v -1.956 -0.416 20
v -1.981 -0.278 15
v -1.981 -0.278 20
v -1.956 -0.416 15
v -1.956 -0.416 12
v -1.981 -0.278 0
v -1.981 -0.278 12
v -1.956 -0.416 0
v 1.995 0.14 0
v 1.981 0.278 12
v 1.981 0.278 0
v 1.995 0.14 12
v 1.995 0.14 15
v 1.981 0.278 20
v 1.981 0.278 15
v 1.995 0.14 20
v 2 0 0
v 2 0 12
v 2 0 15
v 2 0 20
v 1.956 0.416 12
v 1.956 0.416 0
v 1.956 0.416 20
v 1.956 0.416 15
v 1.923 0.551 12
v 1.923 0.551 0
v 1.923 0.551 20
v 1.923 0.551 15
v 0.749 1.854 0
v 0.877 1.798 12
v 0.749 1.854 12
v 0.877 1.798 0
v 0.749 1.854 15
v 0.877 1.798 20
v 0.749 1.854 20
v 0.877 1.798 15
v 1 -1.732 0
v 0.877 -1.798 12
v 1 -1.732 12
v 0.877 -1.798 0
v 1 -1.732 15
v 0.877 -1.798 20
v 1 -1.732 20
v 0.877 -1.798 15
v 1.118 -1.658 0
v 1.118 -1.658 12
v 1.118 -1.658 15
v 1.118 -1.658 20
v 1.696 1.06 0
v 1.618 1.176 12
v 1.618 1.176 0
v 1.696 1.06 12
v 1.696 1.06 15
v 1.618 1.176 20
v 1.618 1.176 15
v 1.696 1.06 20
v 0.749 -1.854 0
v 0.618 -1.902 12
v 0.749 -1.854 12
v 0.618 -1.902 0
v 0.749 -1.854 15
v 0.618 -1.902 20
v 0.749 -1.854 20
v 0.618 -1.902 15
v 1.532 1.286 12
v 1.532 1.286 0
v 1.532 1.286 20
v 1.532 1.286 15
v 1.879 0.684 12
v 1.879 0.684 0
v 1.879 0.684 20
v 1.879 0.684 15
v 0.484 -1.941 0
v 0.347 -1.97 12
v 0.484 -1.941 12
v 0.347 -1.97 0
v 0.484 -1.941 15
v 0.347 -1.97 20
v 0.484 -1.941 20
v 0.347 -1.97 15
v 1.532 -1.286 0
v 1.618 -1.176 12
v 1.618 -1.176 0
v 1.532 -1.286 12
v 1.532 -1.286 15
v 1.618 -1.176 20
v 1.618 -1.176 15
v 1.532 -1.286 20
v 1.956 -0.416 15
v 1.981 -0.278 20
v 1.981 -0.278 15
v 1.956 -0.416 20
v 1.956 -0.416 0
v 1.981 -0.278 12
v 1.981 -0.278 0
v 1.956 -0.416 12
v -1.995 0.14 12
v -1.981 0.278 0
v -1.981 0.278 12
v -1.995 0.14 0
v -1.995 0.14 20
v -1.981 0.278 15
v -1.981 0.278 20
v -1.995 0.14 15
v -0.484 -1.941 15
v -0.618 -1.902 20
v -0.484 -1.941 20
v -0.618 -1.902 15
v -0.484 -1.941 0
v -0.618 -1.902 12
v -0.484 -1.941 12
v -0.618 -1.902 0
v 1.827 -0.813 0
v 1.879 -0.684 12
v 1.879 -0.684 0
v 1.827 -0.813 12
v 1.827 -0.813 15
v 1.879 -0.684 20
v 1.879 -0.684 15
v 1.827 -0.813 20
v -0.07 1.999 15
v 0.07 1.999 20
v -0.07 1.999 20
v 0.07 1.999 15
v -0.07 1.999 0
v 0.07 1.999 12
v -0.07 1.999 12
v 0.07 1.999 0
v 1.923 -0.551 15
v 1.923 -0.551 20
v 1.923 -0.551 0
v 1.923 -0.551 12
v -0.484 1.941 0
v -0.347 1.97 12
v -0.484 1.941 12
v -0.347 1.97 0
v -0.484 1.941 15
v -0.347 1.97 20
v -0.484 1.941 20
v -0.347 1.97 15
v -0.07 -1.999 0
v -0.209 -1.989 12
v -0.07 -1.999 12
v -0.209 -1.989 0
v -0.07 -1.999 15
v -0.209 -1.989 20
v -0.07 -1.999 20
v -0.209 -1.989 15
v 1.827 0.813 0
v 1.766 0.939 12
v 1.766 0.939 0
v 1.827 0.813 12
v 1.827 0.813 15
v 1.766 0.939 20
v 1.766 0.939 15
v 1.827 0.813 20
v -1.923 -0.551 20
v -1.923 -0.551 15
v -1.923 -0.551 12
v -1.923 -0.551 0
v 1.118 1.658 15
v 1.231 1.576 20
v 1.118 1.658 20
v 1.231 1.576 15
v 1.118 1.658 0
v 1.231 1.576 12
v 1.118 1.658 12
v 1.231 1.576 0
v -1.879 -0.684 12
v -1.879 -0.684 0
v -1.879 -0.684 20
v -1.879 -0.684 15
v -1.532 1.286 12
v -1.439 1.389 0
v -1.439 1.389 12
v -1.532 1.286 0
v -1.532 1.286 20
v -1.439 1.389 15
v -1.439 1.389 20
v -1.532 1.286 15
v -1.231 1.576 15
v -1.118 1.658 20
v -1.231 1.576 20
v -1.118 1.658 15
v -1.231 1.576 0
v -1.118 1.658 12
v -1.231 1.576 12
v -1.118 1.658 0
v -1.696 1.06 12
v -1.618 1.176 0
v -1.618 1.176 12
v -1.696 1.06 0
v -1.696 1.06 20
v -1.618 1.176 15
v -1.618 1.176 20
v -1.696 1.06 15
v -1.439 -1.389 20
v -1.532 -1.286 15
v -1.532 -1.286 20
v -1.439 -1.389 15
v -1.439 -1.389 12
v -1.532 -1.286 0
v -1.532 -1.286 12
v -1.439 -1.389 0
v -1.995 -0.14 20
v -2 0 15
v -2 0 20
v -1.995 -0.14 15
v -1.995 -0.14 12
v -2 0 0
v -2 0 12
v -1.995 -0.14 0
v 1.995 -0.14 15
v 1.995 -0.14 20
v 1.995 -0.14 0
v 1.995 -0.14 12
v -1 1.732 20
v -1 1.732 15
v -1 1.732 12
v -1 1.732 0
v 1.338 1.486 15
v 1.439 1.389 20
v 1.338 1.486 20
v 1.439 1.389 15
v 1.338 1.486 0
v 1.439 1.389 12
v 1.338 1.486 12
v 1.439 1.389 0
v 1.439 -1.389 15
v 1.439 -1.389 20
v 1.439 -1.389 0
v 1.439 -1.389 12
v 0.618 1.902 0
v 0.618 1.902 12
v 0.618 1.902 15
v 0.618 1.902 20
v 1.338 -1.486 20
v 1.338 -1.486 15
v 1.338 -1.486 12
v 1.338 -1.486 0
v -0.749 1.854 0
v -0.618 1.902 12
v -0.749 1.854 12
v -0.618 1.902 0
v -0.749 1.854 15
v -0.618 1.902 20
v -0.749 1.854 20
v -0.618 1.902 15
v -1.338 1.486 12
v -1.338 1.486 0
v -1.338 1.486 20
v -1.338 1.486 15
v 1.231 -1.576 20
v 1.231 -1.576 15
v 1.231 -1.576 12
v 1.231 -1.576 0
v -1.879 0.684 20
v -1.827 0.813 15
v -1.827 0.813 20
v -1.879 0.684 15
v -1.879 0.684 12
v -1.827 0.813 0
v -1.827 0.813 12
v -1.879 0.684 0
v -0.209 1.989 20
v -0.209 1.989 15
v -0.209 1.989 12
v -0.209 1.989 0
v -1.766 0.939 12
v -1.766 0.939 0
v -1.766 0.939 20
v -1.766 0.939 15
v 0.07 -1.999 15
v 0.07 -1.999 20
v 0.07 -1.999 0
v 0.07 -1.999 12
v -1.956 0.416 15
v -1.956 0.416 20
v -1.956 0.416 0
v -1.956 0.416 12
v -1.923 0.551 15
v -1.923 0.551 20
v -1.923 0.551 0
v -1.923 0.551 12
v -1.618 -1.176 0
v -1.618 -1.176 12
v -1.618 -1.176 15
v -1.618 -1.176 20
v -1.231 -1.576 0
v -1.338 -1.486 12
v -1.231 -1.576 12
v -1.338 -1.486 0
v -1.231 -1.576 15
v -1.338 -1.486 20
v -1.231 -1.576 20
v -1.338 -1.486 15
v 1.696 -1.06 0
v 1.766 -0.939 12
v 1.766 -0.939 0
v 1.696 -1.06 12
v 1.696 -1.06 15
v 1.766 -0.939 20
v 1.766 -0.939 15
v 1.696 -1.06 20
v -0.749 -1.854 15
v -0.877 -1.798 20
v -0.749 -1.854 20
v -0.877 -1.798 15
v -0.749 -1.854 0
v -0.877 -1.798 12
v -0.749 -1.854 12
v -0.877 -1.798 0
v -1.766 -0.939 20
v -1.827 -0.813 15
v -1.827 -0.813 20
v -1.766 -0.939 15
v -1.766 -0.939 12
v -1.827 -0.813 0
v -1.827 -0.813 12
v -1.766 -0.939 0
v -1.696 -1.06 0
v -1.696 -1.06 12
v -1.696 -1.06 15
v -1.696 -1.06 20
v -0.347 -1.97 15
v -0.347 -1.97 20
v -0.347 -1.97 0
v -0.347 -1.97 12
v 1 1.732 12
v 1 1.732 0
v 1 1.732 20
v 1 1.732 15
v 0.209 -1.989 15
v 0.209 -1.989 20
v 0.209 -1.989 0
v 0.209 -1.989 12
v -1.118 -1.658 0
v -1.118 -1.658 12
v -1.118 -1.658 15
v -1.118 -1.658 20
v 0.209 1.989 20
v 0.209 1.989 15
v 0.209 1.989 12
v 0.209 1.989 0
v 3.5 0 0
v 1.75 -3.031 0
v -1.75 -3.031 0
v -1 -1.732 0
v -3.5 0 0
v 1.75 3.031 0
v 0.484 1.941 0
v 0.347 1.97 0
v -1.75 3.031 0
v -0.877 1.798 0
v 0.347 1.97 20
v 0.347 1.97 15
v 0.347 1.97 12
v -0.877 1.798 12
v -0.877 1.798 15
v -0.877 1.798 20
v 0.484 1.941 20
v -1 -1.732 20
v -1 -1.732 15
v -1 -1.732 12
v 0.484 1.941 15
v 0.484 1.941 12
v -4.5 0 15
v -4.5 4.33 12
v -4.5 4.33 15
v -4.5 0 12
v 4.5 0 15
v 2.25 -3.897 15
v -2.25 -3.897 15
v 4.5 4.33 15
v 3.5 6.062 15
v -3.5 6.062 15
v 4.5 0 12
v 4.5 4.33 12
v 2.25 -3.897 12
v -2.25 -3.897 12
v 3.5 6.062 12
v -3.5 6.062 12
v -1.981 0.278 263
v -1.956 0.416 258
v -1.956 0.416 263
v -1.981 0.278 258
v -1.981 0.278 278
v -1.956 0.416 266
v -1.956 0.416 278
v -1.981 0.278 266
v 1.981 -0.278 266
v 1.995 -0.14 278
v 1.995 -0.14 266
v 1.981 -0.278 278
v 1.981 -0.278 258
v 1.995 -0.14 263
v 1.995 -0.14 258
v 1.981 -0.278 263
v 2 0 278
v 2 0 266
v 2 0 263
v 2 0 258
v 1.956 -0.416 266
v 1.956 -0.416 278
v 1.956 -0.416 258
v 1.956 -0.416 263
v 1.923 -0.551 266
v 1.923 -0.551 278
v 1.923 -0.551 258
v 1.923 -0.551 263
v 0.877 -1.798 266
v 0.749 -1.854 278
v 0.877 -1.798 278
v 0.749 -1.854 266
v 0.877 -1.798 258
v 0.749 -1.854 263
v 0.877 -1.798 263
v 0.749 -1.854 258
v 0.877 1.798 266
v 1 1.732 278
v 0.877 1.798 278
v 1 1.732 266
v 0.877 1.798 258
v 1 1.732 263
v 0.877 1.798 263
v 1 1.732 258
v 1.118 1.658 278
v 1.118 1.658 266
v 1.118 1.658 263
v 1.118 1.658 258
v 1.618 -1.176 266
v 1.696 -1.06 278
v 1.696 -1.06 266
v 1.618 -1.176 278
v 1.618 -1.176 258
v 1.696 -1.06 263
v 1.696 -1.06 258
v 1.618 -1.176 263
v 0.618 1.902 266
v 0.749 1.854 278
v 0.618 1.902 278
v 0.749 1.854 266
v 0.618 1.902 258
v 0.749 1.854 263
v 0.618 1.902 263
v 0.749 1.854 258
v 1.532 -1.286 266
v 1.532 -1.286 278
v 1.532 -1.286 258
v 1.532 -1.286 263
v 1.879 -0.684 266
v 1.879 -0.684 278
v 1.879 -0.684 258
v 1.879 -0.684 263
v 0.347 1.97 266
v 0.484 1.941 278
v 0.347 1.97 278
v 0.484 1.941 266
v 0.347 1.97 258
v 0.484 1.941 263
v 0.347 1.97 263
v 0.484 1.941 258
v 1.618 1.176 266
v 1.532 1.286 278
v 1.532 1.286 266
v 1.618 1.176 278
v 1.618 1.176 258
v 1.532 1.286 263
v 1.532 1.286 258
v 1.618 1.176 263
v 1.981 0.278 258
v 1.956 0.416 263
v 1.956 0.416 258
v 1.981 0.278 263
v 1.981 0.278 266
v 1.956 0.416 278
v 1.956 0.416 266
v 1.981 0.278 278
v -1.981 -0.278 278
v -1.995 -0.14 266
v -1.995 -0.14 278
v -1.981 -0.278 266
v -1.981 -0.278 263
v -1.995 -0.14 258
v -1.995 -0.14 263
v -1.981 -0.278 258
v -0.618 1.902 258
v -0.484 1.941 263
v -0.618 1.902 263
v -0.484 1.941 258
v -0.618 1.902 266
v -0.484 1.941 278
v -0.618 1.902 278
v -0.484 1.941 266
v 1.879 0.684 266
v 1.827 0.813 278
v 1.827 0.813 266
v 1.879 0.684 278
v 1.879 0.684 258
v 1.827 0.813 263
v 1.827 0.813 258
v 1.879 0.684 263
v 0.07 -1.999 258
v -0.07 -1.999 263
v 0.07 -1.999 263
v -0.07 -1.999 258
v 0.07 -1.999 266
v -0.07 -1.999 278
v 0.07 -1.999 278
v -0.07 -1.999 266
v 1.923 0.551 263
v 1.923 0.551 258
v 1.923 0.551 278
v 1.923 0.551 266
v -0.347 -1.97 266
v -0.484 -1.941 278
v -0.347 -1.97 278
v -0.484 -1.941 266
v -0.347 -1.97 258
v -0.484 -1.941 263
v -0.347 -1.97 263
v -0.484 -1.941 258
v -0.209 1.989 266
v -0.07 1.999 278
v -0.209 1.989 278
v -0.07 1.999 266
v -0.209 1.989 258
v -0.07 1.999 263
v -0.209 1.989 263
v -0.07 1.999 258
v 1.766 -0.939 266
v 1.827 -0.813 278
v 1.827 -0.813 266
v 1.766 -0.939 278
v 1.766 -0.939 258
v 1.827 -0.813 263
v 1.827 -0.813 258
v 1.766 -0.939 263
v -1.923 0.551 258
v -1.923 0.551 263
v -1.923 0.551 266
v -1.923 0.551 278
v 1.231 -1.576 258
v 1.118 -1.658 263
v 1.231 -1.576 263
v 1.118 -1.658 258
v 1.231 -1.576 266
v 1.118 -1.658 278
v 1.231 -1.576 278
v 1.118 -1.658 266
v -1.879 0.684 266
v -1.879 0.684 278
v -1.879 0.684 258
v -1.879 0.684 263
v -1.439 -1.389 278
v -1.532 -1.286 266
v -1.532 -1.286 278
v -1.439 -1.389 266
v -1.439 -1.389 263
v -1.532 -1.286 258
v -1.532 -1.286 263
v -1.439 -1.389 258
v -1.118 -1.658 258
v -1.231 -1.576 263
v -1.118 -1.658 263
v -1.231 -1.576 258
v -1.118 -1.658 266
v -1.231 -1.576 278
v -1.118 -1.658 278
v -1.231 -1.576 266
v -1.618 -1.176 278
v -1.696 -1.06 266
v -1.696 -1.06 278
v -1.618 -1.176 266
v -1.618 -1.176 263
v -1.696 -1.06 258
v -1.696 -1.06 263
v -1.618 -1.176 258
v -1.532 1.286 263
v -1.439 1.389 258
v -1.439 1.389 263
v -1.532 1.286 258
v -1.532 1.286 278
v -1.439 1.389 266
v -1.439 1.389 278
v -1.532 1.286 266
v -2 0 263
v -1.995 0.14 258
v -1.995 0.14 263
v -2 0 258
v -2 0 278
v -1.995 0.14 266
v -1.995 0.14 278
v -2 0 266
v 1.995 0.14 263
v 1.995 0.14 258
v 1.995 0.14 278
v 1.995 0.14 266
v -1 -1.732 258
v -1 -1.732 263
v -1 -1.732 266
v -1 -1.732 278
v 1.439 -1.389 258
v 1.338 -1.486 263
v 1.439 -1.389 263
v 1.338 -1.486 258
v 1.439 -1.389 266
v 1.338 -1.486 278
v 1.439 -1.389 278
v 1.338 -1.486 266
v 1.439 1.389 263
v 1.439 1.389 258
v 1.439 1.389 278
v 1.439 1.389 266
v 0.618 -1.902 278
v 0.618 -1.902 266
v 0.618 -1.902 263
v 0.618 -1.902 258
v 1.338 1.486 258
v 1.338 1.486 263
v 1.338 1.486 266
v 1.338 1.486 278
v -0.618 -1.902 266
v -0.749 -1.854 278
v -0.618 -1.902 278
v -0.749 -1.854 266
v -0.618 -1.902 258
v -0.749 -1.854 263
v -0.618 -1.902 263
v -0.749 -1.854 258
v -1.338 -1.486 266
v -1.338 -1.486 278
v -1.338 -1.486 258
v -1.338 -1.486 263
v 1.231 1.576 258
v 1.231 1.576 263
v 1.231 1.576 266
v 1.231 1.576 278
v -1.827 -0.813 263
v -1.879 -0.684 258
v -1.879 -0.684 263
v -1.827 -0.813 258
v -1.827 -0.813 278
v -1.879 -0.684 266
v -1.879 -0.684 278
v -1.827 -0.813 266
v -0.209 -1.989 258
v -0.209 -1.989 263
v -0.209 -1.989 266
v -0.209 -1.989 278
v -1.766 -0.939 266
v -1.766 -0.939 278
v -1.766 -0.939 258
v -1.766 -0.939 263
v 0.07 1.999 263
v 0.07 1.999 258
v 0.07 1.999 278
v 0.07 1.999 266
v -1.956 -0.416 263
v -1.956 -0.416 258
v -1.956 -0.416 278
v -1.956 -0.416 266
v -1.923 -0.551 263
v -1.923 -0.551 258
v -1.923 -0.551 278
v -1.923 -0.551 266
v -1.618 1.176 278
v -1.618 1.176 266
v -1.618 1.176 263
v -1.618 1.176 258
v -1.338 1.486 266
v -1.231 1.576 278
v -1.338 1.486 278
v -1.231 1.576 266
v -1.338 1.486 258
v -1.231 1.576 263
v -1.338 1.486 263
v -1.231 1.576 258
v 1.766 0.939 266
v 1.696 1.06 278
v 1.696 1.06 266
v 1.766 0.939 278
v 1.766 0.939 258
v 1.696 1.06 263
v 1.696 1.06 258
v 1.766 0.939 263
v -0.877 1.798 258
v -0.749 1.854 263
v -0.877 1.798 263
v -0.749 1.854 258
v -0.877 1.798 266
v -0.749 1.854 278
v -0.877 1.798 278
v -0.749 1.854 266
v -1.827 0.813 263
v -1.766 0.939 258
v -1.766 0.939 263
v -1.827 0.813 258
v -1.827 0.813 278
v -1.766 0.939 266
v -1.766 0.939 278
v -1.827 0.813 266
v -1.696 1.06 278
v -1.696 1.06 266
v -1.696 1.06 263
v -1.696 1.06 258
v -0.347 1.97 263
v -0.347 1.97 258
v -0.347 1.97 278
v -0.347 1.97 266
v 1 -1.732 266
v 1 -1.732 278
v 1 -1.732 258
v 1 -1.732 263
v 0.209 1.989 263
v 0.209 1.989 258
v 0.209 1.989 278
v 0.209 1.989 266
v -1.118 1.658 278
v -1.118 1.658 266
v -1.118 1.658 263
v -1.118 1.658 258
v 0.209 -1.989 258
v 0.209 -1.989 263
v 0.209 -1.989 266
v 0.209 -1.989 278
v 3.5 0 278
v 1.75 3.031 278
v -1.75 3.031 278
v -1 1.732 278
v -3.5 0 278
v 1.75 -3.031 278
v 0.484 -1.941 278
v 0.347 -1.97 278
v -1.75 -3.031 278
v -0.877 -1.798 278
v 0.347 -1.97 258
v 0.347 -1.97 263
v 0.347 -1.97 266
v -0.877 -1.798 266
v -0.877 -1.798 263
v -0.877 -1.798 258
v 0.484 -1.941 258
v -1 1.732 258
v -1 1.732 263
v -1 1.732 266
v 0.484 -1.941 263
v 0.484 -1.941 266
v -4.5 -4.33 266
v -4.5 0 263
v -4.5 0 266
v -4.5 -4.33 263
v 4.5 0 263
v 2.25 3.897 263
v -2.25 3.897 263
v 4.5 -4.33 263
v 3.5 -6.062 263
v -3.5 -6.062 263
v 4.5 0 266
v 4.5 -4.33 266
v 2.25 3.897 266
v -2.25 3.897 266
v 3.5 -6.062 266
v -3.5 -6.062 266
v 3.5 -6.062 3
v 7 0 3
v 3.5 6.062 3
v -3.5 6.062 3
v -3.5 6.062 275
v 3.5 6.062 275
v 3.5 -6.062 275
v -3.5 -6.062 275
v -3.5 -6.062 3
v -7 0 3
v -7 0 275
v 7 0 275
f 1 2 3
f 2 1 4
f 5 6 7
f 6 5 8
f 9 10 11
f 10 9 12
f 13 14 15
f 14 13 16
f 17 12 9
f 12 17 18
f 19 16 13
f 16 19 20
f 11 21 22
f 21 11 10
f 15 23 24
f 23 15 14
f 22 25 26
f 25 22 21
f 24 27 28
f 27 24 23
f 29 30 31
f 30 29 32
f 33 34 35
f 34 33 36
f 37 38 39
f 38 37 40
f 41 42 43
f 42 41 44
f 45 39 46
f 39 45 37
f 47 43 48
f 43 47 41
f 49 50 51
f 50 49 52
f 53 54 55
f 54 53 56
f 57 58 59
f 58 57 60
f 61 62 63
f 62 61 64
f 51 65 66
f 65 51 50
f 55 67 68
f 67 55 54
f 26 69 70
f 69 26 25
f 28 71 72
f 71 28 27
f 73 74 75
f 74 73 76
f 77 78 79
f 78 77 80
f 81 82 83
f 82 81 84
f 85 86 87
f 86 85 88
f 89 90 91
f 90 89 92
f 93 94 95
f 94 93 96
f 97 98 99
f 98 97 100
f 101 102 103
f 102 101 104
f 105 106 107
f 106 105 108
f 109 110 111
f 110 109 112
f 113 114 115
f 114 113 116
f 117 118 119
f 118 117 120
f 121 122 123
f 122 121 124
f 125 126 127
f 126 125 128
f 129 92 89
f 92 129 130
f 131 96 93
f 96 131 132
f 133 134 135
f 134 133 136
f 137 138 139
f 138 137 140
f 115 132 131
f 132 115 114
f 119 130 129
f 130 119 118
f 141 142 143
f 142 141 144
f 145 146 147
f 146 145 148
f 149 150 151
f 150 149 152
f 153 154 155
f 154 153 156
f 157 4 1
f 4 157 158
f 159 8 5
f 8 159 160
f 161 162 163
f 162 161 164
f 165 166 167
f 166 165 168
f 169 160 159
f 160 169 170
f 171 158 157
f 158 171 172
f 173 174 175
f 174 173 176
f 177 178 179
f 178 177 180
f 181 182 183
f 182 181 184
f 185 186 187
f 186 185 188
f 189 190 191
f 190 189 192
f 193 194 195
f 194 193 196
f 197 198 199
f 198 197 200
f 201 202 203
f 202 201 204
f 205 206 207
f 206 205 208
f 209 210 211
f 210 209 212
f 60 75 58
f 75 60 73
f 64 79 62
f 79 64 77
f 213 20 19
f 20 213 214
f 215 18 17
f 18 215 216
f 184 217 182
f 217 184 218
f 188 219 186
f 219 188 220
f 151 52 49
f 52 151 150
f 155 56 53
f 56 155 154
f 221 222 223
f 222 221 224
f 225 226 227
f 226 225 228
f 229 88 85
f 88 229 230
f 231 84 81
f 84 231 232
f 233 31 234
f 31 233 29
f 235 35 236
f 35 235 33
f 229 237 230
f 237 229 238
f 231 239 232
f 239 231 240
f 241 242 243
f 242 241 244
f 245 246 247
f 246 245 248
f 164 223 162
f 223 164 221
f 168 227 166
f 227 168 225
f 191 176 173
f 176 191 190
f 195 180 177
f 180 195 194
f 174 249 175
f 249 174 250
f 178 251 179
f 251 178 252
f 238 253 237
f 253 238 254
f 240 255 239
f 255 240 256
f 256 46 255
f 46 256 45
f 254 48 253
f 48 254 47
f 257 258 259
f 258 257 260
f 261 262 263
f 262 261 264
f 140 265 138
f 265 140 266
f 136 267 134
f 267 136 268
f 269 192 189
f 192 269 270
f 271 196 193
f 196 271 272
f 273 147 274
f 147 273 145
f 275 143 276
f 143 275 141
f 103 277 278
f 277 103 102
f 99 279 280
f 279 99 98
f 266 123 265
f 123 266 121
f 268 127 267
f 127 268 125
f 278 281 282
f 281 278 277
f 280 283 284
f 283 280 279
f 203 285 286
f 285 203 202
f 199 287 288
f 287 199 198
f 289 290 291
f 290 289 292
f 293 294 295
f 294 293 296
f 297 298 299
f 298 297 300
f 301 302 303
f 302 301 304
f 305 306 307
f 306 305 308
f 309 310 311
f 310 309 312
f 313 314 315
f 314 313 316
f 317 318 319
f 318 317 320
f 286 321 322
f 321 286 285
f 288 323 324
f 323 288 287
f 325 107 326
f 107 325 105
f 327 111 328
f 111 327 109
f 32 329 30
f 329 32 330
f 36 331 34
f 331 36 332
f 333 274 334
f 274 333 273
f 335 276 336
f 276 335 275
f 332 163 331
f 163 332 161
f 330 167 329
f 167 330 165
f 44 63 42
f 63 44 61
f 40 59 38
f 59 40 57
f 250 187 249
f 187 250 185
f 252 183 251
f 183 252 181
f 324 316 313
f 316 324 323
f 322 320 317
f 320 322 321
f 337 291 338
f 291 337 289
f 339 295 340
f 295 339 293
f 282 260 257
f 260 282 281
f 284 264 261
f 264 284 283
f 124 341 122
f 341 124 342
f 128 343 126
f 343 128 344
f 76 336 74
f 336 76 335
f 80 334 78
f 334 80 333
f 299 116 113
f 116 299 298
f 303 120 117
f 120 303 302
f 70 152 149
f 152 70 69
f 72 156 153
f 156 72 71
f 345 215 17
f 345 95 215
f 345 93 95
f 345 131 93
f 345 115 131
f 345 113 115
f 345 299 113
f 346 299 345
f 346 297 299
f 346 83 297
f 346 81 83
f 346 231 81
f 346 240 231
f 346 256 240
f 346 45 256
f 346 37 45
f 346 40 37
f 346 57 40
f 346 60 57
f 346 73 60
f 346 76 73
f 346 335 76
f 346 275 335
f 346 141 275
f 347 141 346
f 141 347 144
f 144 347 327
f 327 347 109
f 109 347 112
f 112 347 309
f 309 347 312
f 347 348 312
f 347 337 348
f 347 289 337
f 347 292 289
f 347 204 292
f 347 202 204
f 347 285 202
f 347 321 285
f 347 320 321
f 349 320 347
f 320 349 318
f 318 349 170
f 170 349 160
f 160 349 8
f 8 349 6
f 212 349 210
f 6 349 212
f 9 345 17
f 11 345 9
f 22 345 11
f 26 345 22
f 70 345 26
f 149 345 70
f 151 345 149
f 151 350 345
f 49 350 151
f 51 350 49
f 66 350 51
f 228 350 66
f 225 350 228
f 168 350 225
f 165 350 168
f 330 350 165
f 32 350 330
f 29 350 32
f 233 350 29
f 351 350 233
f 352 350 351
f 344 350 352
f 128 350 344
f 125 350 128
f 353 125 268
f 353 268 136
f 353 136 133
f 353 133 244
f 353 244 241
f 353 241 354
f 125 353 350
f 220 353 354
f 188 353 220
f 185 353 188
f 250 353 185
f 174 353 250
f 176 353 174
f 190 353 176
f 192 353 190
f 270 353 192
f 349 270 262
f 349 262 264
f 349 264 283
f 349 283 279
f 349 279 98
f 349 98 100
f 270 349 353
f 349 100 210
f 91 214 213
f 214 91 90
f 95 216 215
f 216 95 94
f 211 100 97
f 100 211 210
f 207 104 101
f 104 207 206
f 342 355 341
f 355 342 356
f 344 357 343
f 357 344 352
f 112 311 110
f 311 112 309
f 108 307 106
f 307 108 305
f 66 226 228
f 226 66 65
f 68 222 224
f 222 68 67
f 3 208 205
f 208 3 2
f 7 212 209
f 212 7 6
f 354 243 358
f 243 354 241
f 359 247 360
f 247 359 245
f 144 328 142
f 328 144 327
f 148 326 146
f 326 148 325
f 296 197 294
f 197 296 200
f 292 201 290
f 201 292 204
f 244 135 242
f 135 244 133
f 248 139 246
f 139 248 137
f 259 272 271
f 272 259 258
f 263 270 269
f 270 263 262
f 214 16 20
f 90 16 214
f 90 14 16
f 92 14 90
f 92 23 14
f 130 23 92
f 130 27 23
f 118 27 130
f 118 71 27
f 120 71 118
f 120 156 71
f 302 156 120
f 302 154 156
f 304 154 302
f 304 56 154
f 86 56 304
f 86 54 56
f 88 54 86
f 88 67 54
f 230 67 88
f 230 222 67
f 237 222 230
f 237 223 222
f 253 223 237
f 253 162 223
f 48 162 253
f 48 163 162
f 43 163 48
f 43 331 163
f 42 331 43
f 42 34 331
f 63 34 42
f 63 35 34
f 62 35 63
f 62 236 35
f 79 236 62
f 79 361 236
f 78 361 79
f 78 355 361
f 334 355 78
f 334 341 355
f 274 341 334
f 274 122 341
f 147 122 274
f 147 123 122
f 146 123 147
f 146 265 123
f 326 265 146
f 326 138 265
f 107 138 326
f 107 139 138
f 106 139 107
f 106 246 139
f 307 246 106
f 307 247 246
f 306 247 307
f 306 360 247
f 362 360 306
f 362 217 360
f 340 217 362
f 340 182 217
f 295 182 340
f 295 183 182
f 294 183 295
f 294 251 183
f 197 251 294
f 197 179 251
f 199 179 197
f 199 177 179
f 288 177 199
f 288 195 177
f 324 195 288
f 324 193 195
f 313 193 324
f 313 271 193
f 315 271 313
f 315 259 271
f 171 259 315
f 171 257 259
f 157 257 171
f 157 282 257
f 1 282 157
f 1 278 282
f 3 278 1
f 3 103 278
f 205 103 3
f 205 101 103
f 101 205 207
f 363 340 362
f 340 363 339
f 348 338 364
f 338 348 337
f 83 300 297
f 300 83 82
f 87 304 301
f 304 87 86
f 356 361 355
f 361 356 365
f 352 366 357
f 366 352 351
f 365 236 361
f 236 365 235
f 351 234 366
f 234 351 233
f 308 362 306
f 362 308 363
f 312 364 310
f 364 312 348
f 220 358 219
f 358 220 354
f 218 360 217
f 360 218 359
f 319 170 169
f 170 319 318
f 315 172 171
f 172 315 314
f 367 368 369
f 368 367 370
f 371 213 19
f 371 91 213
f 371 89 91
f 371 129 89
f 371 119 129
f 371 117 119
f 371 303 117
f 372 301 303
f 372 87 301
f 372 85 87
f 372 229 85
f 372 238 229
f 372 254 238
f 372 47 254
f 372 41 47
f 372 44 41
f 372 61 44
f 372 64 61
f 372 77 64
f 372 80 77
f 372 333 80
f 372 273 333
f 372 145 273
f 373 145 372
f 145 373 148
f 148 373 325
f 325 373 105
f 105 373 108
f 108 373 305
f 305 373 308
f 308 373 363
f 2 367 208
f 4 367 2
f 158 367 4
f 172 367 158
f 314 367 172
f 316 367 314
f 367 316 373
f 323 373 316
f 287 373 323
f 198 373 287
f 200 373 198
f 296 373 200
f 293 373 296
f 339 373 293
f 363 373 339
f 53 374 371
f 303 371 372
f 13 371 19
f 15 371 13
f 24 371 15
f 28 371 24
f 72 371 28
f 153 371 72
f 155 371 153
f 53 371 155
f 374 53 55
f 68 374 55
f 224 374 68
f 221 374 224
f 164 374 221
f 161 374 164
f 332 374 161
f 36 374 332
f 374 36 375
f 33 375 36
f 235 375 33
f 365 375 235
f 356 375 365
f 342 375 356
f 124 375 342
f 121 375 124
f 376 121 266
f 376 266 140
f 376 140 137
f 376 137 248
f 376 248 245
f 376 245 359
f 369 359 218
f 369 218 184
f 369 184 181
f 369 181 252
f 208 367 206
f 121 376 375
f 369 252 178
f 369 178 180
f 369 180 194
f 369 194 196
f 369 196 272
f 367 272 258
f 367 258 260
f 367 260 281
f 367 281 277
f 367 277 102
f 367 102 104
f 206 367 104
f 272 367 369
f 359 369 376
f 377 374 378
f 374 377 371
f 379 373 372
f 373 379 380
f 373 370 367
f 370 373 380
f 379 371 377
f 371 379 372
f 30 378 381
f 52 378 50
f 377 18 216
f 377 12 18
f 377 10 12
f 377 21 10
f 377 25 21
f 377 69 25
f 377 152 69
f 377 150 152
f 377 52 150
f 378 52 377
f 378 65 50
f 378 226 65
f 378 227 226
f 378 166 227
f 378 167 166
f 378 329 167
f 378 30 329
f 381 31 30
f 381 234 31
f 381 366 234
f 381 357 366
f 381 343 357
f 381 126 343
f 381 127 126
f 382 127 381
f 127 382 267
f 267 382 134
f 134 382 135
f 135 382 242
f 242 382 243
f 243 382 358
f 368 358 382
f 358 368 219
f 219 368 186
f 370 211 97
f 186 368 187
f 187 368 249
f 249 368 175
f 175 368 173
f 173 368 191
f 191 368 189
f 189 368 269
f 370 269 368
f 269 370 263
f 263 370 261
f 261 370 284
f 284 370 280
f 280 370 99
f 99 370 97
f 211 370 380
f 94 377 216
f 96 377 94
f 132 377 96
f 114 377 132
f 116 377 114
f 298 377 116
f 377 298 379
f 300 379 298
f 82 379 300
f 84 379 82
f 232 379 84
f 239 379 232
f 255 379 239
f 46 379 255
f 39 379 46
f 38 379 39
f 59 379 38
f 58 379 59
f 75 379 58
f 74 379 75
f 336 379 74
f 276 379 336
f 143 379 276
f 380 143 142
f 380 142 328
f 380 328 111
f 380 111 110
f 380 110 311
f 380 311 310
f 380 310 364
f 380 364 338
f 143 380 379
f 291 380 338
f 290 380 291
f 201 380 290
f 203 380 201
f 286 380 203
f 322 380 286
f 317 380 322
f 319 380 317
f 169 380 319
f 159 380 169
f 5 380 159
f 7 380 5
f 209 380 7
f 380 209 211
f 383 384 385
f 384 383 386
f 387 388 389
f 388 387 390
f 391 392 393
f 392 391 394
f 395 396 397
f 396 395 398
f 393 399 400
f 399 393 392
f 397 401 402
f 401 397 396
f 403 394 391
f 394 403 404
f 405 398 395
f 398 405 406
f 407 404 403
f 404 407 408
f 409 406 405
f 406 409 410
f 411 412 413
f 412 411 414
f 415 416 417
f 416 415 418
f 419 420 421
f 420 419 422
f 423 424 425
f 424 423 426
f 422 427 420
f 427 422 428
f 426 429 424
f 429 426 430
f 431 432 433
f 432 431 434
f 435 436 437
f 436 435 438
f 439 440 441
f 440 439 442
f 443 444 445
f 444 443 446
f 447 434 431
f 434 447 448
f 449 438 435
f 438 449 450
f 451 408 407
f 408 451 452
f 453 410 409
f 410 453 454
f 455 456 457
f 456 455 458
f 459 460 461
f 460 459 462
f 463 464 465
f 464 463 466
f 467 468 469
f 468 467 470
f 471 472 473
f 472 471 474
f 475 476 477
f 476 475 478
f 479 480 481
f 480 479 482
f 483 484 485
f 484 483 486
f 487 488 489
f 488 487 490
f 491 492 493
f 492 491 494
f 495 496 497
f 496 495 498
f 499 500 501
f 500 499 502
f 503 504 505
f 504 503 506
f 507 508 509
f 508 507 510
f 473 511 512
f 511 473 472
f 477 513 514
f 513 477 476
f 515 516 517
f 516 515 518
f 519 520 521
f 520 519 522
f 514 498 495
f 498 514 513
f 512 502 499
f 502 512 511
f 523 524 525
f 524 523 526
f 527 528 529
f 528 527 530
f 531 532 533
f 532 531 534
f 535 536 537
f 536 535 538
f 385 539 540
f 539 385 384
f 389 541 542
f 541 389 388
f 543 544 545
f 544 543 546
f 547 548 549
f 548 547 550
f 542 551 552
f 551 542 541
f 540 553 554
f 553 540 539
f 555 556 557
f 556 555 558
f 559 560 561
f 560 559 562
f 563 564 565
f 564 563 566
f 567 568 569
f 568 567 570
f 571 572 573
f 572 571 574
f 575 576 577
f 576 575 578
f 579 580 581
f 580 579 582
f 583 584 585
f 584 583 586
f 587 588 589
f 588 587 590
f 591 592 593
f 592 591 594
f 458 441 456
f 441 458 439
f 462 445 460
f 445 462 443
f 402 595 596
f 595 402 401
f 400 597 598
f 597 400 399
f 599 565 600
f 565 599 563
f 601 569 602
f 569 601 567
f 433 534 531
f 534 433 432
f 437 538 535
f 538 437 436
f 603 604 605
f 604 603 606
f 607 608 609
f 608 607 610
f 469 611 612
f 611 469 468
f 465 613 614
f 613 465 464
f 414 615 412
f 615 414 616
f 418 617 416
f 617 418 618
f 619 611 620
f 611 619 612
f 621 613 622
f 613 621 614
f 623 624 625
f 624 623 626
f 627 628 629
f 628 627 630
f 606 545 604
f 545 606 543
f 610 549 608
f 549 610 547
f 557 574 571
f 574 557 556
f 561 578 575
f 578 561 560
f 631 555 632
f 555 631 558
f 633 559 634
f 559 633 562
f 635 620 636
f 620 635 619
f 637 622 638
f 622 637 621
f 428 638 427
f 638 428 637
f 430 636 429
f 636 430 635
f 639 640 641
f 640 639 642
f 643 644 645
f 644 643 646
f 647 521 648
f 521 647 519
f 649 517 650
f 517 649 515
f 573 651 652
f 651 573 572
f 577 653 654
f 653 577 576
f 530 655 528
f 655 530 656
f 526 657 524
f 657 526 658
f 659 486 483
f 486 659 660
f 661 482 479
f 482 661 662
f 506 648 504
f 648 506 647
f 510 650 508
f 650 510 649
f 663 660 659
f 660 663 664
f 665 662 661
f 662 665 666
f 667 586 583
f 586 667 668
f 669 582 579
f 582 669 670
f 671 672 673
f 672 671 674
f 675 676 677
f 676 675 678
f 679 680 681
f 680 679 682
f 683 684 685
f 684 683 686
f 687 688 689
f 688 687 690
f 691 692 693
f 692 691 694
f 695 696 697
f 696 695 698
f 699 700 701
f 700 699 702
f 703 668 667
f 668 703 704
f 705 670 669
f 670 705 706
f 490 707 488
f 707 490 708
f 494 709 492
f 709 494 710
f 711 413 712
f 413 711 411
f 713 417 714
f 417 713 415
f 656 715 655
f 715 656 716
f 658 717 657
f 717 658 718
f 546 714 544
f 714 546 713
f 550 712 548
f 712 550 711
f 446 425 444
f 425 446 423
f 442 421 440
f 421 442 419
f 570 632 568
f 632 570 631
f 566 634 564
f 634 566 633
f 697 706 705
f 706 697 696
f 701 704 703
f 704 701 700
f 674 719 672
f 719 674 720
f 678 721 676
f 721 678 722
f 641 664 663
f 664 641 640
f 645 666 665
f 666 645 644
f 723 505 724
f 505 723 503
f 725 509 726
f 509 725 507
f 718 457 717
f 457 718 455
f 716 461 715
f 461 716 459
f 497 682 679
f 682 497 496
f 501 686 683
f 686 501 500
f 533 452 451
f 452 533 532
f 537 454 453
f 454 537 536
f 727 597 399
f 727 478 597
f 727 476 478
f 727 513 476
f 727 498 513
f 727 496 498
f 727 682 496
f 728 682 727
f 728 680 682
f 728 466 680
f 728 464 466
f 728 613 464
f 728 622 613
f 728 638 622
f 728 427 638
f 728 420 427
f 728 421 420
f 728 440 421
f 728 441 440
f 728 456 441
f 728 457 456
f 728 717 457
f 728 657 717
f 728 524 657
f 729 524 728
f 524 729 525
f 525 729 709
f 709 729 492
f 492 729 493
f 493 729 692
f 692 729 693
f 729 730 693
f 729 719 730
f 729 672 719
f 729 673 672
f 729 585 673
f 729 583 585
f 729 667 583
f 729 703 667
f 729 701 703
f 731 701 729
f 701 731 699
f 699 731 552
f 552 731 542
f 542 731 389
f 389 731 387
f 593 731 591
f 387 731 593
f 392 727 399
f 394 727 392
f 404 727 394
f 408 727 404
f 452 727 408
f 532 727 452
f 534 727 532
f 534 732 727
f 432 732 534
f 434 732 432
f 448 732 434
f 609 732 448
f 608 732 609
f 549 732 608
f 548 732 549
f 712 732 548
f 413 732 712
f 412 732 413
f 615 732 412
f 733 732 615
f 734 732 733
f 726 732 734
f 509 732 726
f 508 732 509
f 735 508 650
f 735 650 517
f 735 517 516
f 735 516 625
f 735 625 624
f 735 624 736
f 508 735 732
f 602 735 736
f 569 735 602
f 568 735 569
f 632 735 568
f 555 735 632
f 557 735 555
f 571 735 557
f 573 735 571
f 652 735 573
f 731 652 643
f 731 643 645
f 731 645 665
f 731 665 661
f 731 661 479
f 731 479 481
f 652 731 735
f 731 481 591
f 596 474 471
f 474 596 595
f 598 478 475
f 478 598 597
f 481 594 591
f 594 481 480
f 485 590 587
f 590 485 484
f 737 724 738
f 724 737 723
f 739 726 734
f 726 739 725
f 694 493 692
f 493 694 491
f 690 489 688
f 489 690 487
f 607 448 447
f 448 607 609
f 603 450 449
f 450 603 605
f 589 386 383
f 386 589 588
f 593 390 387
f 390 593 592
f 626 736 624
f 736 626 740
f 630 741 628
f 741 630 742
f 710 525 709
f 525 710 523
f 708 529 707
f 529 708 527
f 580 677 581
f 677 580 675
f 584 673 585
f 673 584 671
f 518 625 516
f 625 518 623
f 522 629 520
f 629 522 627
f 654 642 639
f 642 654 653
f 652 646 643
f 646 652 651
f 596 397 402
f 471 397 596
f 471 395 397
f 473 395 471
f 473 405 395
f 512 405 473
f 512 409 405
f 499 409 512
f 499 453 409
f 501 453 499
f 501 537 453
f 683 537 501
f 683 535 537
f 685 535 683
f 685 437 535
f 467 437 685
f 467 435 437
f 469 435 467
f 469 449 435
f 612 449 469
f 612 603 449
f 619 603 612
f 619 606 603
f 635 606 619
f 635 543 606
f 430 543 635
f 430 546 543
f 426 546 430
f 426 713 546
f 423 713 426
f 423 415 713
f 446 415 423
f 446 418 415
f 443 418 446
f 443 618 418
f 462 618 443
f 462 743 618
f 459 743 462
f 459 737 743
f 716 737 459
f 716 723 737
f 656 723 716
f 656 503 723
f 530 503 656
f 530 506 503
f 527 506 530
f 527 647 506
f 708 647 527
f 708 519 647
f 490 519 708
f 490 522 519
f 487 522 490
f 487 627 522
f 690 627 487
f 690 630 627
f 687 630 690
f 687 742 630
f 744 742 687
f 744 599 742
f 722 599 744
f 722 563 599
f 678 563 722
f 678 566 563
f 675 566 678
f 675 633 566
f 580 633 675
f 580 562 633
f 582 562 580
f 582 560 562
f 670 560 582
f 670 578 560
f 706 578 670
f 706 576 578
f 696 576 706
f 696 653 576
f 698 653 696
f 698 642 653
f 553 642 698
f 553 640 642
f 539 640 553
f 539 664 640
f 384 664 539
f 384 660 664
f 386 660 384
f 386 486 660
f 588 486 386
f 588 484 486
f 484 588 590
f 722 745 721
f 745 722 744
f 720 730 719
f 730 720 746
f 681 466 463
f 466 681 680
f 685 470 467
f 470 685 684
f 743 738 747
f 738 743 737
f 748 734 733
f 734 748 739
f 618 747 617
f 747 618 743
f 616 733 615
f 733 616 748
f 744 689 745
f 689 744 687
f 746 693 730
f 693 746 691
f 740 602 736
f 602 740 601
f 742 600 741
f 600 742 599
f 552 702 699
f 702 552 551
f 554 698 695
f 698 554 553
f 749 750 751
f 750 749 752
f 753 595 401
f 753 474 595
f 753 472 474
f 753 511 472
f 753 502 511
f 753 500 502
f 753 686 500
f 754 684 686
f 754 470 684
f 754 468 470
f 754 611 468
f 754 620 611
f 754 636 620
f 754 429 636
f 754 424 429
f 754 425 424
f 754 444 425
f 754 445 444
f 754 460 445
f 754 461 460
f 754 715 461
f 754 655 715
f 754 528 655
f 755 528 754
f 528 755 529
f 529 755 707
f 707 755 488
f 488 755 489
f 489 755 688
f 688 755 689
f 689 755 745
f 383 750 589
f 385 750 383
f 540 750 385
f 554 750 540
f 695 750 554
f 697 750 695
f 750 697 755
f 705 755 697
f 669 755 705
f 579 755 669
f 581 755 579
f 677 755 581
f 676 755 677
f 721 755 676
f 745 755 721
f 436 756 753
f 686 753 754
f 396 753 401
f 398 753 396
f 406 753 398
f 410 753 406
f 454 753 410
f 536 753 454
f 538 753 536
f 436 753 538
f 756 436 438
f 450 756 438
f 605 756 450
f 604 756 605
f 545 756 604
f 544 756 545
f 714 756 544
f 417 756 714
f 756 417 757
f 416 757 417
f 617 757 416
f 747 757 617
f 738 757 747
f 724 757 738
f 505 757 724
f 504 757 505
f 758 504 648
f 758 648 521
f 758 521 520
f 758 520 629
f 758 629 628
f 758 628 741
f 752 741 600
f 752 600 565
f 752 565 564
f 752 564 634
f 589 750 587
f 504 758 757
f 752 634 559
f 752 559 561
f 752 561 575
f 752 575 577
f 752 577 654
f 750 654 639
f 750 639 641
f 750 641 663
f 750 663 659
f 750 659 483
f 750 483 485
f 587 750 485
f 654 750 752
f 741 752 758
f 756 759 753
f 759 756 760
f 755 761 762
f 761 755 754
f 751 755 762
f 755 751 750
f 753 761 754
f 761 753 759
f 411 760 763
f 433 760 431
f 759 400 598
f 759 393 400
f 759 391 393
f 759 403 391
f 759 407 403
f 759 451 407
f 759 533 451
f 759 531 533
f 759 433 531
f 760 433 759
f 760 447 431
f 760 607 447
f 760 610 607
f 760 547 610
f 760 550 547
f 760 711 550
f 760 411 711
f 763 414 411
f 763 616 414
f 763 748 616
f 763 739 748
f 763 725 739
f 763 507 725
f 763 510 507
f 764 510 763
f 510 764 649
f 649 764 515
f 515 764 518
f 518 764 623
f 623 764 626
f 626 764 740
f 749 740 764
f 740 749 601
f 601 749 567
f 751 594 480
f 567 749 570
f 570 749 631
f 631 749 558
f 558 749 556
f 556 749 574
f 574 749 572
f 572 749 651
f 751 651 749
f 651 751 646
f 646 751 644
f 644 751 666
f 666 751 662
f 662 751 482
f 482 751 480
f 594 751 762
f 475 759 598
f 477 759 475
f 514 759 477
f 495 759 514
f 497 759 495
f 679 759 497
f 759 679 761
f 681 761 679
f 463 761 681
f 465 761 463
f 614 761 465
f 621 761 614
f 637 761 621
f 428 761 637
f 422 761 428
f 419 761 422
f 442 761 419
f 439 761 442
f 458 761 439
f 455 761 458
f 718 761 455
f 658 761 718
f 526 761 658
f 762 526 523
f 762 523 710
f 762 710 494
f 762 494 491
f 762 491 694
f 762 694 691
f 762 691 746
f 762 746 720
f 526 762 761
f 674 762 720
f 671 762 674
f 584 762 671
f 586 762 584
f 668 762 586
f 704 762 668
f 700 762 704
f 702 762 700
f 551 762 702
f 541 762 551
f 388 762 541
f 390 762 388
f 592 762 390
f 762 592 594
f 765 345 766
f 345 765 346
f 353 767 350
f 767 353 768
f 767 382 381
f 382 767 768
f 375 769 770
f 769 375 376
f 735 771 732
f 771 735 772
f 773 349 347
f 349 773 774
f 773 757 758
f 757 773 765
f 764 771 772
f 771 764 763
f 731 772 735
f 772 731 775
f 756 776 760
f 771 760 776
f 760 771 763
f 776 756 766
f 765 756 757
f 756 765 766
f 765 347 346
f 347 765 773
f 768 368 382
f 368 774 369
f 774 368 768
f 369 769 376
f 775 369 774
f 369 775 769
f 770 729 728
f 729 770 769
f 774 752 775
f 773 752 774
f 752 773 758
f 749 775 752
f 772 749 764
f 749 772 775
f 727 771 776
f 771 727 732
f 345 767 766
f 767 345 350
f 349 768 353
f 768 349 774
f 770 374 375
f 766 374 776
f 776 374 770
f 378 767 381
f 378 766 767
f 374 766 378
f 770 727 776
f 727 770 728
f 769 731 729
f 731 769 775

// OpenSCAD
// Threaded ball diameter in mm
ballDiameter = 10; // [8, 10, 12]

// Thickness of the push rod
rodDiameter = 14; // [5:20]

// Total intended push rod length (center to center between ball joints) 
pushRodLength = 288; // [50:400]

// Width of the grub screw
grubScrewDiameter = 4; // [3,4,5]

// Maximum length of the grub screw
grubScrewLength = 20; // [5:50]

// Nut trap distance from rod end
nutTrapOffset = 12; // [4:30]

// Width of the nut trap
nutTrapWidth = 9; 

// Height of the nut trap
nutTrapHeight = 3; 

/* [Hidden] */
lipWidth = 1;
taperLength = 3;
rodSideCount = 6;
nutSideCount = 6;


difference() {
    hull() {
        cylinder(r=lipWidth + ballDiameter/4, h=pushRodLength-ballDiameter, $fn=rodSideCount);  
        translate([0,0,taperLength])
            cylinder(r=rodDiameter/2, h=pushRodLength-ballDiameter-2*taperLength, $fn=rodSideCount);    
    };
    for (i = [[0,0],[pushRodLength-ballDiameter,180]]) {
        translate([0,0,i[0]]) rotate([i[1],0,0]) {
            cylinder(r=grubScrewDiameter/2, h=grubScrewLength, $fn=90);
            translate([0,0,nutTrapOffset])  
                hull() {
                    cylinder(r=nutTrapWidth/2, h=nutTrapHeight, $fn=nutSideCount);
                    translate([0,rodDiameter/2,0]) 
                        cylinder(r=nutTrapWidth/2, h=nutTrapHeight, $fn=nutSideCount);
                };
        }
    };
}
